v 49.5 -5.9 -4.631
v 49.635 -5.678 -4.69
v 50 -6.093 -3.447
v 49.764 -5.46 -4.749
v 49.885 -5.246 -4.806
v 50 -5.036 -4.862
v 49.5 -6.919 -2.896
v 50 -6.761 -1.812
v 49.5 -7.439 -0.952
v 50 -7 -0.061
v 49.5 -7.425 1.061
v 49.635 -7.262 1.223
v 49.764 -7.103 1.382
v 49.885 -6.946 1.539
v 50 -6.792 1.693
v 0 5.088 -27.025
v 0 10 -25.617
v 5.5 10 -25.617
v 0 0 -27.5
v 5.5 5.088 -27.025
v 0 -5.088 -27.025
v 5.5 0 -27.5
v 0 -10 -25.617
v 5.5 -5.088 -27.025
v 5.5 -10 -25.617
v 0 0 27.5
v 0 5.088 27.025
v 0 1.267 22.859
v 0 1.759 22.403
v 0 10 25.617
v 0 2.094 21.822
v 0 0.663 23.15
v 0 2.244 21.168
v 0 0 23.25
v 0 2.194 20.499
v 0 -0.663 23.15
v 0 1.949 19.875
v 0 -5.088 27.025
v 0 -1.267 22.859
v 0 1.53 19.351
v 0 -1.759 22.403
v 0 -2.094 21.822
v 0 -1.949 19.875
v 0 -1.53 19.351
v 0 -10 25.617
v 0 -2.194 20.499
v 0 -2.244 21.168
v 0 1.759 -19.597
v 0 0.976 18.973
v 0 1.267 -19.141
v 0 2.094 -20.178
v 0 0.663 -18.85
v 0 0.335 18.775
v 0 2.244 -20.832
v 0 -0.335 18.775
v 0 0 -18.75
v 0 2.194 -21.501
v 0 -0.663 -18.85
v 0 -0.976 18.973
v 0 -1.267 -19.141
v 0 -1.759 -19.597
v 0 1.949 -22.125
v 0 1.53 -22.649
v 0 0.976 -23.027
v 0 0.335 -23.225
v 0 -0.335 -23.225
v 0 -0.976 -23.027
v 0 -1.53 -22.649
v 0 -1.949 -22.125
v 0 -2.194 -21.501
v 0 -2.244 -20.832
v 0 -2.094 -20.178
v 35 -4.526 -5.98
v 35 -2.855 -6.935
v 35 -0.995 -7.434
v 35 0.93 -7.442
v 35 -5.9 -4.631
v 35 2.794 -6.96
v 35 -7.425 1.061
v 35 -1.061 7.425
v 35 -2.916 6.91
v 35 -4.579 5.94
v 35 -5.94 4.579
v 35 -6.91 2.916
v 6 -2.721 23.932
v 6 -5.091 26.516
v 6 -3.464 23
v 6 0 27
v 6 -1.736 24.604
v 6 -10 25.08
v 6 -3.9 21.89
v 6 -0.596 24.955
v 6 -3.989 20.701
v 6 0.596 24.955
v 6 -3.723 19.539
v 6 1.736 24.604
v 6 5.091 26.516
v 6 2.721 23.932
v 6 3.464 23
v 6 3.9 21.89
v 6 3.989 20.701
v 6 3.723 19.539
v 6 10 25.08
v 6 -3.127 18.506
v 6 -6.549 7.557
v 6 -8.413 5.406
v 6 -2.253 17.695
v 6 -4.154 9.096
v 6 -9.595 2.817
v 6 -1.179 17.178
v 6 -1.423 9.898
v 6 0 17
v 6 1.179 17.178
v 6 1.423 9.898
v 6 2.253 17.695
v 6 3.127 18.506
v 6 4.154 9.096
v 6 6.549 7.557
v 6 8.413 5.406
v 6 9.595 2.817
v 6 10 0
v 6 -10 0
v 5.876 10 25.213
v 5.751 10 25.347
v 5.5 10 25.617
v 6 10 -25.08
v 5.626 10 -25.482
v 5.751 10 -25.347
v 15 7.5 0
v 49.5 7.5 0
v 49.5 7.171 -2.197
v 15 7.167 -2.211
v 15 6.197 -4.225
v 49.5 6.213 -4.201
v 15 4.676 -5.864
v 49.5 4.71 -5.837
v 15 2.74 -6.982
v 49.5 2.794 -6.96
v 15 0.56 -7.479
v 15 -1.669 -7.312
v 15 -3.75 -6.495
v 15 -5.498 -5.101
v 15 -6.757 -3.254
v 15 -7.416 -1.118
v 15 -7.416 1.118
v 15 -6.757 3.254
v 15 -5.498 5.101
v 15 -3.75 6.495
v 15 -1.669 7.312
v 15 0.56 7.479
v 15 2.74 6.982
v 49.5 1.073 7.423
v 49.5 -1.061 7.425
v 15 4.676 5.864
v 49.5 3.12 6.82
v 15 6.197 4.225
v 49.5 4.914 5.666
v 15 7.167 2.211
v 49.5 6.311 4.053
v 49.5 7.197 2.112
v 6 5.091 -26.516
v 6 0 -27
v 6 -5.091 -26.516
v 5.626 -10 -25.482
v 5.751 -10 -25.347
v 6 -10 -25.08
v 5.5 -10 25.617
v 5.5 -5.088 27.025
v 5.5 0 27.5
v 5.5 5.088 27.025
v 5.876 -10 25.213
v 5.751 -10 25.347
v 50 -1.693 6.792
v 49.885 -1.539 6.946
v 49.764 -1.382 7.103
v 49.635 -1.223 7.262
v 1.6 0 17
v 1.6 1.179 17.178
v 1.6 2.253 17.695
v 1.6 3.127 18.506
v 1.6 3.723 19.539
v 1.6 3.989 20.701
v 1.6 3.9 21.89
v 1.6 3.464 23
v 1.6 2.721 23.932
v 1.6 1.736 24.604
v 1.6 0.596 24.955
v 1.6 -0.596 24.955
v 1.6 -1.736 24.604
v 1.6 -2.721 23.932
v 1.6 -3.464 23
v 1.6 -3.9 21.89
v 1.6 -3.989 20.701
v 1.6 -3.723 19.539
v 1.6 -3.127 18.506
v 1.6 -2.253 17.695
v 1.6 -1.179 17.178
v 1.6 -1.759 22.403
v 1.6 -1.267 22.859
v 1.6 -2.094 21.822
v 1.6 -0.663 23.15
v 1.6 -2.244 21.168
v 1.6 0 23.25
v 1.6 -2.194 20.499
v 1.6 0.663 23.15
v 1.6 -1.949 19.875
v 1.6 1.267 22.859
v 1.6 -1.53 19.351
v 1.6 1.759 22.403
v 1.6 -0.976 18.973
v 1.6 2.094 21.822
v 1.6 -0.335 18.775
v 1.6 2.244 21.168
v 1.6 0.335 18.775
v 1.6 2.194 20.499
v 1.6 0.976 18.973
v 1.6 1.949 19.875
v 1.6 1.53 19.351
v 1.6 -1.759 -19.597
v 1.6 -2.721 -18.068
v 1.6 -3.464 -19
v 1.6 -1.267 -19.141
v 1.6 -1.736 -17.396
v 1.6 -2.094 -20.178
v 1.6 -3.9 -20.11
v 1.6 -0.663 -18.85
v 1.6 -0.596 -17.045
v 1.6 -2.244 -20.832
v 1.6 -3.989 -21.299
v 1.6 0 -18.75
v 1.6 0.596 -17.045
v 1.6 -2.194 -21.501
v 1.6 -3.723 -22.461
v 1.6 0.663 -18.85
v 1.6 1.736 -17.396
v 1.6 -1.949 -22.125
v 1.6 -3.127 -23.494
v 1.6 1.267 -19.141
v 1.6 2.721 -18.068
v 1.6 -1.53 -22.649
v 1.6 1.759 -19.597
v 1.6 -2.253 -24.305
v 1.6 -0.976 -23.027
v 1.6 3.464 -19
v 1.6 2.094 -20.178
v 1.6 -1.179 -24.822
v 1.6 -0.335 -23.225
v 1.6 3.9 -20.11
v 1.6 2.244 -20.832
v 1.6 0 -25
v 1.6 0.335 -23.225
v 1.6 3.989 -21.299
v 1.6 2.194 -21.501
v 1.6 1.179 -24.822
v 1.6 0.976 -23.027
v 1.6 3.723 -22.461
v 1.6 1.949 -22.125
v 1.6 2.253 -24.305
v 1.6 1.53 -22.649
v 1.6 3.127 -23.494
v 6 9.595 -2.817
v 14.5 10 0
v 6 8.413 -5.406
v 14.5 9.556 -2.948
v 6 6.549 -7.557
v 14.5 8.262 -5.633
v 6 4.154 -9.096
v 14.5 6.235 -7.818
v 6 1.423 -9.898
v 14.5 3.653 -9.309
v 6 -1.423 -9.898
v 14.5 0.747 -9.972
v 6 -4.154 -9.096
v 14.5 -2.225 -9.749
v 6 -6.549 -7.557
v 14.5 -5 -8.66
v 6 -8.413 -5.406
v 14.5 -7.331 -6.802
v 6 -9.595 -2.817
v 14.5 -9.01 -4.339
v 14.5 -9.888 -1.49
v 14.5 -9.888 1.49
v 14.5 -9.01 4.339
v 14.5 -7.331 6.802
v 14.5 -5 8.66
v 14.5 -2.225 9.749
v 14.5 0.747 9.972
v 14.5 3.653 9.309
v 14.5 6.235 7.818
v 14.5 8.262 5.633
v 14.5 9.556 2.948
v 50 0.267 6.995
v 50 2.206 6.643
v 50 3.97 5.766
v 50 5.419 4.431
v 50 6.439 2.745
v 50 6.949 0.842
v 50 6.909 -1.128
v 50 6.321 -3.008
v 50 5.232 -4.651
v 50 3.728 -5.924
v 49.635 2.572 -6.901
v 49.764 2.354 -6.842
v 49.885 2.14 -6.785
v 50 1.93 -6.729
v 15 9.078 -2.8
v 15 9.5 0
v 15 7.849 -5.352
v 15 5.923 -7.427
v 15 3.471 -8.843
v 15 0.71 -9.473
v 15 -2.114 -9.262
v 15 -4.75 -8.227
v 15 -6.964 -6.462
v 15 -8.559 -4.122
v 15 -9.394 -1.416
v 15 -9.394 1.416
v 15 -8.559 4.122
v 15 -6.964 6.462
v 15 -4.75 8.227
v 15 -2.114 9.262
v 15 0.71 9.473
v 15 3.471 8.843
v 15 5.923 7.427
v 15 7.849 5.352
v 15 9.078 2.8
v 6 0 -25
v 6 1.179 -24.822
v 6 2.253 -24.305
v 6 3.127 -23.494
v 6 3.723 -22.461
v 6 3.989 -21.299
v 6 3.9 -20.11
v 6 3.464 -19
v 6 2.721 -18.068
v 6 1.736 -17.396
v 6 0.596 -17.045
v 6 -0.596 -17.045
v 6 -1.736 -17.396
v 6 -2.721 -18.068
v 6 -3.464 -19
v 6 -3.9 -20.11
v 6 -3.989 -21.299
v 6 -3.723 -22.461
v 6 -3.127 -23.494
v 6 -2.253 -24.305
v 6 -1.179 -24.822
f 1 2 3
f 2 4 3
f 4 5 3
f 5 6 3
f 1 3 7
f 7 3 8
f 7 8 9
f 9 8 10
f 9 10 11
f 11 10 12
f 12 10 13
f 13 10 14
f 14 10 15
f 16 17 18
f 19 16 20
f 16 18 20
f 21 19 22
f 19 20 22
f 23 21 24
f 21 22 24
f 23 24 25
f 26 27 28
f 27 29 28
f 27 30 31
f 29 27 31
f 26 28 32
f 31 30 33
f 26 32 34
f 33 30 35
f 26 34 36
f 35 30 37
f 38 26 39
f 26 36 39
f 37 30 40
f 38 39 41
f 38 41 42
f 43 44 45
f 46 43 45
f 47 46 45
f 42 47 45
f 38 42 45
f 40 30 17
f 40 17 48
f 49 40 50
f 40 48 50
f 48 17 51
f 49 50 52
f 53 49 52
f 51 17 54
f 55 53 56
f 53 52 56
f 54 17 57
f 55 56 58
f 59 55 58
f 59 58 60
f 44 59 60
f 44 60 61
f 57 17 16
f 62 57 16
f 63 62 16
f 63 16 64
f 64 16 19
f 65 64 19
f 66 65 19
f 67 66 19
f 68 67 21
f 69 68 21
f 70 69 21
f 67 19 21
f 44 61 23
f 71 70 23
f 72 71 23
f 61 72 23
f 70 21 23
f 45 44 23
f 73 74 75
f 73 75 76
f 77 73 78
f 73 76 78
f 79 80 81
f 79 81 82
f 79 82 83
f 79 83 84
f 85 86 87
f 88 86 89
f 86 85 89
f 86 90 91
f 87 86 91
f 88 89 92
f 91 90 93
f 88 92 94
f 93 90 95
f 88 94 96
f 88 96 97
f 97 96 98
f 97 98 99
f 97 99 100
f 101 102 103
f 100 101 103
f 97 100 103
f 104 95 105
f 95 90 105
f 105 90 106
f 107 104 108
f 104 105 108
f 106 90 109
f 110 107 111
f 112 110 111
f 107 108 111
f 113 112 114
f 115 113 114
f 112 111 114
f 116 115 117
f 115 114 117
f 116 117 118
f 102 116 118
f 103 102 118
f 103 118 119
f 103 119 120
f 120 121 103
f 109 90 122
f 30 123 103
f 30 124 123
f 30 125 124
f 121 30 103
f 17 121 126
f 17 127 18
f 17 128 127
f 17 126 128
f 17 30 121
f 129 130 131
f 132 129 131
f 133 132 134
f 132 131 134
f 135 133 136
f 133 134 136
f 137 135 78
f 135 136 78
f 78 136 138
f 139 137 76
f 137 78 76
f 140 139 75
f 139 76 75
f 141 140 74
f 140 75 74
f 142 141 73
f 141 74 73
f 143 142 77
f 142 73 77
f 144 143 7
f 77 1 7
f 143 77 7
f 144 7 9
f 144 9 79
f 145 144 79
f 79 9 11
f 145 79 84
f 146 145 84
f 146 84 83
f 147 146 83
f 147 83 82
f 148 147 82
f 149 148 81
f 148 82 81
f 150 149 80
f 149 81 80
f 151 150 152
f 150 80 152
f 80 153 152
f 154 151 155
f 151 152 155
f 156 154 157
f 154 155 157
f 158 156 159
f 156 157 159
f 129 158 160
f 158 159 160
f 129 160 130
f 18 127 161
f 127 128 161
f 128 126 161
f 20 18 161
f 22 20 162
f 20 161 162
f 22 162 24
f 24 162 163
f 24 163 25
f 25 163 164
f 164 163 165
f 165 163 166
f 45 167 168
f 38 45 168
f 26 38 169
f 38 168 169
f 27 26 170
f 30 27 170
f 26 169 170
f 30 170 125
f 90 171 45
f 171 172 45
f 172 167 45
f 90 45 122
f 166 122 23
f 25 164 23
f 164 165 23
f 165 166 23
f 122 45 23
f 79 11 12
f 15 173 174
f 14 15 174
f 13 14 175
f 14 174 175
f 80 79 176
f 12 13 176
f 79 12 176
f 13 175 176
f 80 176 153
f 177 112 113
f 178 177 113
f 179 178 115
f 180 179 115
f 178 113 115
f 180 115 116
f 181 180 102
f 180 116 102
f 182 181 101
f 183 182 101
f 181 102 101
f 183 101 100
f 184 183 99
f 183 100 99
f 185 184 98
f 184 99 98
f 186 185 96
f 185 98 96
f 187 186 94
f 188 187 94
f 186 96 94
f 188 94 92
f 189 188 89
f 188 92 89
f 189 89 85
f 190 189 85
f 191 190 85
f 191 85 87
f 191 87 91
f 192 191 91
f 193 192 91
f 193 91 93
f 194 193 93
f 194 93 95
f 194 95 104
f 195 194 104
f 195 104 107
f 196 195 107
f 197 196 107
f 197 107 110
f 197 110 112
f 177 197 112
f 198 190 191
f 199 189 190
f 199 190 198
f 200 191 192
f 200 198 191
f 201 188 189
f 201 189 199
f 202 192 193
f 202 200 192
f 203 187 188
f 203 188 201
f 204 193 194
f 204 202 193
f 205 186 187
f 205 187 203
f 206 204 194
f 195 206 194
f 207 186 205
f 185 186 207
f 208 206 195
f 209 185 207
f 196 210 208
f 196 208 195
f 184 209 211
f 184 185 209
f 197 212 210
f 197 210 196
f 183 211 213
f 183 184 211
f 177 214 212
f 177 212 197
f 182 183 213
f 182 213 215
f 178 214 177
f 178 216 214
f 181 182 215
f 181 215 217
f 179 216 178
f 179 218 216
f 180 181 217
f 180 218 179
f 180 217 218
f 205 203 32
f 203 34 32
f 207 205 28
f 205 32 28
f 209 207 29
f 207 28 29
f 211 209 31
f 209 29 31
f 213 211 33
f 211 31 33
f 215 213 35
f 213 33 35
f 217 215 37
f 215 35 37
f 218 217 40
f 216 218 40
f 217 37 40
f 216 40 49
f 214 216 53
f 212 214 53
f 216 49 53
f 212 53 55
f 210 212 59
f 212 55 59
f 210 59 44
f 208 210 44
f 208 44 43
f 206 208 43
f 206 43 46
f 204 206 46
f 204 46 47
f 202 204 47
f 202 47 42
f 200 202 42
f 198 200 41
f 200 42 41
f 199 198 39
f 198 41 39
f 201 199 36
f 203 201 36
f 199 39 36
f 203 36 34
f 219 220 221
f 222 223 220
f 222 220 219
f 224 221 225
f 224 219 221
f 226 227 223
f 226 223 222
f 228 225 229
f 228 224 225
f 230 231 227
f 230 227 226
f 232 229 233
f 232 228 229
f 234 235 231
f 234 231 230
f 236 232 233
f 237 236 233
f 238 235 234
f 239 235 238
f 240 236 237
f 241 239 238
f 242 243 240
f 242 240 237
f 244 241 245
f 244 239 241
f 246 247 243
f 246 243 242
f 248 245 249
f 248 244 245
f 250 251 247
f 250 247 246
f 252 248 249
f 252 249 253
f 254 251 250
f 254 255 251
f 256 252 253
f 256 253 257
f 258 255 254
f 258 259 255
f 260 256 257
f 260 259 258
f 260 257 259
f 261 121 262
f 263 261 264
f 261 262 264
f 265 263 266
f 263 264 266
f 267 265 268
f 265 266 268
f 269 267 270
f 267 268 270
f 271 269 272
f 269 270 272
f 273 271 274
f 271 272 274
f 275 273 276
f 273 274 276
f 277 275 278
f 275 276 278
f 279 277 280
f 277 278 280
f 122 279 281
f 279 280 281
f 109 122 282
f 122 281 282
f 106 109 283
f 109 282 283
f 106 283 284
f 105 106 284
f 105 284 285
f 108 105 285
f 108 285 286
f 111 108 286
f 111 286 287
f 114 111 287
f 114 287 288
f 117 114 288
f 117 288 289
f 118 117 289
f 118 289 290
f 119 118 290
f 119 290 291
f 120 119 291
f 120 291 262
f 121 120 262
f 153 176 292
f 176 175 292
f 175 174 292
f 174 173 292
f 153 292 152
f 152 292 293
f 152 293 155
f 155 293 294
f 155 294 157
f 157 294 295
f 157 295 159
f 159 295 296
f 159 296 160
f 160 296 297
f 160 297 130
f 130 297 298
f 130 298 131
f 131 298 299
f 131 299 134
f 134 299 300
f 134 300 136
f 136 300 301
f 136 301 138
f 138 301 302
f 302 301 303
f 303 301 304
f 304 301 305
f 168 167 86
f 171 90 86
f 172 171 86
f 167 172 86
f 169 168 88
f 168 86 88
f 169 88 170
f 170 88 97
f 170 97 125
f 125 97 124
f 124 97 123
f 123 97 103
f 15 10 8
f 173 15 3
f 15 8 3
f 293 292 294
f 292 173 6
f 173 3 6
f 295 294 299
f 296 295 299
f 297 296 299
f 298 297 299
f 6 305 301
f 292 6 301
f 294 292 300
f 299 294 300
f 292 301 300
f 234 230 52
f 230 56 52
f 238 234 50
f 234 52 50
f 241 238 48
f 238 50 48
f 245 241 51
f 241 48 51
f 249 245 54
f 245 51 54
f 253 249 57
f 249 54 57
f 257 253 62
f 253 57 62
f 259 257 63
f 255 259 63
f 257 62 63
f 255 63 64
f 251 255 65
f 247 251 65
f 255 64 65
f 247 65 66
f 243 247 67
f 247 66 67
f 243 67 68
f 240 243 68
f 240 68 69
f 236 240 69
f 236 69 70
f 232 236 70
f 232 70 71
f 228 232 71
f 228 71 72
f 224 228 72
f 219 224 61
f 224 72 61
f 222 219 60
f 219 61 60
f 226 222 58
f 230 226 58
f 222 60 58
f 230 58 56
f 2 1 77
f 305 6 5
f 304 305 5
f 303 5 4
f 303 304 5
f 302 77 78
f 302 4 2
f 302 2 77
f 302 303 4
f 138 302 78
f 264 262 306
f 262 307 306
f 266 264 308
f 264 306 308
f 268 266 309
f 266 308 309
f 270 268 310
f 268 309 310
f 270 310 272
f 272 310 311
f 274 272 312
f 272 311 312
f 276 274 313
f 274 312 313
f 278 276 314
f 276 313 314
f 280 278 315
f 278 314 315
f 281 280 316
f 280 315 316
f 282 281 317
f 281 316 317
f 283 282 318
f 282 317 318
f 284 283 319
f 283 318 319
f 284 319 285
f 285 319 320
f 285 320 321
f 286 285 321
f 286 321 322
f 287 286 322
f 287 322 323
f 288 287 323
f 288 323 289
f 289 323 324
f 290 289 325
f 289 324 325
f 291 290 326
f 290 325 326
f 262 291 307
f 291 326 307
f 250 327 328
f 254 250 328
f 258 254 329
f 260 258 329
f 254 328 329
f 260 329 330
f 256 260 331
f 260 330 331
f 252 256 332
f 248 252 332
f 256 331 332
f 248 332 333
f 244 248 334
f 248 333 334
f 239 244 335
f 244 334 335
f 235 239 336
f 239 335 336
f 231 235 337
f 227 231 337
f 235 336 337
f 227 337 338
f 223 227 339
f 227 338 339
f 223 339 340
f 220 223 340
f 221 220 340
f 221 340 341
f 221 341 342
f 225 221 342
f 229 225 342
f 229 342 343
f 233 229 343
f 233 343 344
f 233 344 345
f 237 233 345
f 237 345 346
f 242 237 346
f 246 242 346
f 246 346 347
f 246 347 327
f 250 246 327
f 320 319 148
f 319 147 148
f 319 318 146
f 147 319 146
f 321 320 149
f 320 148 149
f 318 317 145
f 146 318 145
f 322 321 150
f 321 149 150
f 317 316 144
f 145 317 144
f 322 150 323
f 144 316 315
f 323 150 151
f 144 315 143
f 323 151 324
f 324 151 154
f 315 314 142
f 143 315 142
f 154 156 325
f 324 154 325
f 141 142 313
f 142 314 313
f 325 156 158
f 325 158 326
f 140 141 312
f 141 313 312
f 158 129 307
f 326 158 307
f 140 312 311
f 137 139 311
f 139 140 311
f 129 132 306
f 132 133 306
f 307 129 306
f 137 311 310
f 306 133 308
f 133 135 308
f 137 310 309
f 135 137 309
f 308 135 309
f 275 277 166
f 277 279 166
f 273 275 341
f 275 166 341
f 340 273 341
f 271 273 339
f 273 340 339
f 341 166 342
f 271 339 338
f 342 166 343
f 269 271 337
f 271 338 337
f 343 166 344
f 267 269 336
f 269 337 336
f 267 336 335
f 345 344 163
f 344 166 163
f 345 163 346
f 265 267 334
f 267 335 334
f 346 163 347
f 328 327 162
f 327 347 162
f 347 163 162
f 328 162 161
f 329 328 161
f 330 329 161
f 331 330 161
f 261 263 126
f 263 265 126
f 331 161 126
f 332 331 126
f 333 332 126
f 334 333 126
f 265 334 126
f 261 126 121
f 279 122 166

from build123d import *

# Parameters (mm, degrees)
CHANFREIN1_SIZE                                    = 0.5
CHAMBRAGE_POUR_VIS_T_TE_HEXAGONALE_M41_D           = 4.5
CHAMBRAGE_POUR_VIS_T_TE_HEXAGONALE_M41_CBORE_D     = 8
CHAMBRAGE_POUR_VIS_T_TE_HEXAGONALE_M41_CBORE_DEPTH = 4.4
ENL_V_MAT_EXTRU_1_DEPTH                            = 15
ENL_V_MAT_EXTRU_2_DEPTH                            = 64.344297297
CHANFREIN3_SIZE                                    = 0.5


with BuildPart() as part:
    # Esquisse1 → Révolution1 (revolve)
    with BuildSketch(Plane.XY):
        Polygon((15, 7.5), (50, 7.5), (50, 0), (0, 0), (0, 27.5), (6, 27.5), (6, 10), (15, 10), align=None)
    revolve(axis=Axis((50, 0, 0), (-1, 0, 0)))

    # Chanfrein1
    chanfrein1_edges = [part.edges().sort_by_distance(p)[0] for p in [
        (6, -27.5, 0),
        (15, -10, 0),
    ]]
    chamfer(chanfrein1_edges, length=CHANFREIN1_SIZE)

    # Chambrage pour vis à tête hexagonale M41 (through all)
    with Locations(Plane(origin=(6, 0, 0), x_dir=(0, 0, -1), z_dir=(1, 0, 0))):
        with Locations((-21, 0), (21, 0)):
            CounterBoreHole(CHAMBRAGE_POUR_VIS_T_TE_HEXAGONALE_M41_D / 2, CHAMBRAGE_POUR_VIS_T_TE_HEXAGONALE_M41_CBORE_D / 2, CHAMBRAGE_POUR_VIS_T_TE_HEXAGONALE_M41_CBORE_DEPTH)

    # Esquisse8 → Enlèv. mat.-Extru.1 (cut)
    with BuildSketch(Plane(origin=(50, 0, 0), x_dir=(0, 0, -1), z_dir=(1, 0, 0))):
        with BuildLine():
            Line((-1.060660172, -7.424621202), (-7.424621202, -1.060660172))
            ThreePointArc((-7.424621202, -1.060660172), (-5.303300859, -5.303300859), (-1.060660172, -7.424621202))
        make_face()
        with BuildLine():
            Line((4.630869255, -5.899580489), (6.960240661, 2.793751948))
            ThreePointArc((6.960240661, 2.793751948), (7.244443697, -1.941142838), (4.630869255, -5.899580489))
        make_face()
    extrude(amount=-ENL_V_MAT_EXTRU_1_DEPTH, mode=Mode.SUBTRACT)

    # Esquisse11 → Enlèv. mat.-Extru.2 (cut, through all)
    with BuildSketch(Plane.ZY):
        with BuildLine():
            Line((25.617376915, -10), (-25.617376915, -10))
            ThreePointArc((-25.617376915, -10), (0, -27.5), (25.617376915, -10))
        make_face()
        with BuildLine():
            Line((25.617376915, 10), (-25.617376915, 10))
            ThreePointArc((-25.617376915, 10), (0, 27.5), (25.617376915, 10))
        make_face()
    extrude(amount=-ENL_V_MAT_EXTRU_2_DEPTH, mode=Mode.SUBTRACT)

    # Chanfrein3
    chanfrein3_edges = [part.edges().sort_by_distance(p)[0] for p in [
        (50, -7.244443697, -1.941142838),
        (50, 4.91401306, 5.665904662),
    ]]
    chamfer(chanfrein3_edges, length=CHANFREIN3_SIZE)


solid = part.part
